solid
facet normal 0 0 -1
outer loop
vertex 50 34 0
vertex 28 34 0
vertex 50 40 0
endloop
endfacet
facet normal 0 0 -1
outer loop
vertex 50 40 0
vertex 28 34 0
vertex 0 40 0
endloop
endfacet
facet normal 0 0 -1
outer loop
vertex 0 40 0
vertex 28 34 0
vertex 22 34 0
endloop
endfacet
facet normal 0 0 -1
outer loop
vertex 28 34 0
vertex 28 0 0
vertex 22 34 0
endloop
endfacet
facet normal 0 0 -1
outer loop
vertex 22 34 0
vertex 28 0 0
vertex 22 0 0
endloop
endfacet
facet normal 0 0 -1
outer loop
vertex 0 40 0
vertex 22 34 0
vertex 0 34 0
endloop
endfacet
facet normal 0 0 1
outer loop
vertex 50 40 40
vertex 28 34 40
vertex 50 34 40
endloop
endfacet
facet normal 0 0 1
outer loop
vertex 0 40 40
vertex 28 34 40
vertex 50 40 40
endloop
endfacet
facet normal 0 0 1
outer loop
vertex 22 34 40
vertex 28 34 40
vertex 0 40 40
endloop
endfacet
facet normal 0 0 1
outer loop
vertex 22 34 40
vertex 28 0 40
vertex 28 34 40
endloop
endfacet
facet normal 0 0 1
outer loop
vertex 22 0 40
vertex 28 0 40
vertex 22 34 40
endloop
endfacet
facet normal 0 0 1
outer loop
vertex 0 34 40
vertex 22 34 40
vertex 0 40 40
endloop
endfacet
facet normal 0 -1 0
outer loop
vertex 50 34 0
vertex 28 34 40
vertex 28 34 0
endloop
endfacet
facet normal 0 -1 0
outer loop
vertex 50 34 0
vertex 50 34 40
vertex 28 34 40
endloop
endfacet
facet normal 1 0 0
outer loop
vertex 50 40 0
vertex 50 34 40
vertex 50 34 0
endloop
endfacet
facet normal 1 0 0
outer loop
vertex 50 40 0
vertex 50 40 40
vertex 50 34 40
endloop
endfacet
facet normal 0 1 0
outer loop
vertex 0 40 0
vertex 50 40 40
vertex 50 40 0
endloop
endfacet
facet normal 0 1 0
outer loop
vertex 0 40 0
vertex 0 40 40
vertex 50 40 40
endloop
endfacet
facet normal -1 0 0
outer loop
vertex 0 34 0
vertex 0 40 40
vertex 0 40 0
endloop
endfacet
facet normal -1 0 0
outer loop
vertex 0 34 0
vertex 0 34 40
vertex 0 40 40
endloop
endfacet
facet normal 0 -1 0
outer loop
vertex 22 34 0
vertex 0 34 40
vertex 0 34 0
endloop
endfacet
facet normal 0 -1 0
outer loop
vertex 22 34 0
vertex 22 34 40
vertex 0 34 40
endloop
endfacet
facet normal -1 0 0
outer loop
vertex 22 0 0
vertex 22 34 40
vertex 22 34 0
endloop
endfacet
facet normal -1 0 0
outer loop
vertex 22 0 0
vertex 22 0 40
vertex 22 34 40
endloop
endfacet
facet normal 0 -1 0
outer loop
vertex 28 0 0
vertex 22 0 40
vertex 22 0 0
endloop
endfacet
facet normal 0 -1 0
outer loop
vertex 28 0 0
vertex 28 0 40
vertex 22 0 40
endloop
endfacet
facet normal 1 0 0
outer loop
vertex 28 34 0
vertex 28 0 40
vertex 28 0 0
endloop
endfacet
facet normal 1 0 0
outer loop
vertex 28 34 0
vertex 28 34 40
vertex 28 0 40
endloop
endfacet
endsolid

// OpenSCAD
$fn = 32;

// ----------------------------------------------------------------------
// Structural section: tee 50 x 40 mm
// ----------------------------------------------------------------------

// --- parameters (mm) ---
sec_w = 50;               // tee width, X
sec_h = 40;               // tee height, Y
flange_t = 6;             // top flange thickness
web_t = 6;                // web thickness
plate_t = 40;             // cut length, Z (extrusion height)

profile = [[22, 0], [28, 0], [28, 34], [50, 34], [50, 40], [0, 40], [0, 34], [22, 34]];  // primary outline, 8 points, counter clockwise

// --- the one profile operation ---
linear_extrude(height = plate_t) polygon(points = profile);
